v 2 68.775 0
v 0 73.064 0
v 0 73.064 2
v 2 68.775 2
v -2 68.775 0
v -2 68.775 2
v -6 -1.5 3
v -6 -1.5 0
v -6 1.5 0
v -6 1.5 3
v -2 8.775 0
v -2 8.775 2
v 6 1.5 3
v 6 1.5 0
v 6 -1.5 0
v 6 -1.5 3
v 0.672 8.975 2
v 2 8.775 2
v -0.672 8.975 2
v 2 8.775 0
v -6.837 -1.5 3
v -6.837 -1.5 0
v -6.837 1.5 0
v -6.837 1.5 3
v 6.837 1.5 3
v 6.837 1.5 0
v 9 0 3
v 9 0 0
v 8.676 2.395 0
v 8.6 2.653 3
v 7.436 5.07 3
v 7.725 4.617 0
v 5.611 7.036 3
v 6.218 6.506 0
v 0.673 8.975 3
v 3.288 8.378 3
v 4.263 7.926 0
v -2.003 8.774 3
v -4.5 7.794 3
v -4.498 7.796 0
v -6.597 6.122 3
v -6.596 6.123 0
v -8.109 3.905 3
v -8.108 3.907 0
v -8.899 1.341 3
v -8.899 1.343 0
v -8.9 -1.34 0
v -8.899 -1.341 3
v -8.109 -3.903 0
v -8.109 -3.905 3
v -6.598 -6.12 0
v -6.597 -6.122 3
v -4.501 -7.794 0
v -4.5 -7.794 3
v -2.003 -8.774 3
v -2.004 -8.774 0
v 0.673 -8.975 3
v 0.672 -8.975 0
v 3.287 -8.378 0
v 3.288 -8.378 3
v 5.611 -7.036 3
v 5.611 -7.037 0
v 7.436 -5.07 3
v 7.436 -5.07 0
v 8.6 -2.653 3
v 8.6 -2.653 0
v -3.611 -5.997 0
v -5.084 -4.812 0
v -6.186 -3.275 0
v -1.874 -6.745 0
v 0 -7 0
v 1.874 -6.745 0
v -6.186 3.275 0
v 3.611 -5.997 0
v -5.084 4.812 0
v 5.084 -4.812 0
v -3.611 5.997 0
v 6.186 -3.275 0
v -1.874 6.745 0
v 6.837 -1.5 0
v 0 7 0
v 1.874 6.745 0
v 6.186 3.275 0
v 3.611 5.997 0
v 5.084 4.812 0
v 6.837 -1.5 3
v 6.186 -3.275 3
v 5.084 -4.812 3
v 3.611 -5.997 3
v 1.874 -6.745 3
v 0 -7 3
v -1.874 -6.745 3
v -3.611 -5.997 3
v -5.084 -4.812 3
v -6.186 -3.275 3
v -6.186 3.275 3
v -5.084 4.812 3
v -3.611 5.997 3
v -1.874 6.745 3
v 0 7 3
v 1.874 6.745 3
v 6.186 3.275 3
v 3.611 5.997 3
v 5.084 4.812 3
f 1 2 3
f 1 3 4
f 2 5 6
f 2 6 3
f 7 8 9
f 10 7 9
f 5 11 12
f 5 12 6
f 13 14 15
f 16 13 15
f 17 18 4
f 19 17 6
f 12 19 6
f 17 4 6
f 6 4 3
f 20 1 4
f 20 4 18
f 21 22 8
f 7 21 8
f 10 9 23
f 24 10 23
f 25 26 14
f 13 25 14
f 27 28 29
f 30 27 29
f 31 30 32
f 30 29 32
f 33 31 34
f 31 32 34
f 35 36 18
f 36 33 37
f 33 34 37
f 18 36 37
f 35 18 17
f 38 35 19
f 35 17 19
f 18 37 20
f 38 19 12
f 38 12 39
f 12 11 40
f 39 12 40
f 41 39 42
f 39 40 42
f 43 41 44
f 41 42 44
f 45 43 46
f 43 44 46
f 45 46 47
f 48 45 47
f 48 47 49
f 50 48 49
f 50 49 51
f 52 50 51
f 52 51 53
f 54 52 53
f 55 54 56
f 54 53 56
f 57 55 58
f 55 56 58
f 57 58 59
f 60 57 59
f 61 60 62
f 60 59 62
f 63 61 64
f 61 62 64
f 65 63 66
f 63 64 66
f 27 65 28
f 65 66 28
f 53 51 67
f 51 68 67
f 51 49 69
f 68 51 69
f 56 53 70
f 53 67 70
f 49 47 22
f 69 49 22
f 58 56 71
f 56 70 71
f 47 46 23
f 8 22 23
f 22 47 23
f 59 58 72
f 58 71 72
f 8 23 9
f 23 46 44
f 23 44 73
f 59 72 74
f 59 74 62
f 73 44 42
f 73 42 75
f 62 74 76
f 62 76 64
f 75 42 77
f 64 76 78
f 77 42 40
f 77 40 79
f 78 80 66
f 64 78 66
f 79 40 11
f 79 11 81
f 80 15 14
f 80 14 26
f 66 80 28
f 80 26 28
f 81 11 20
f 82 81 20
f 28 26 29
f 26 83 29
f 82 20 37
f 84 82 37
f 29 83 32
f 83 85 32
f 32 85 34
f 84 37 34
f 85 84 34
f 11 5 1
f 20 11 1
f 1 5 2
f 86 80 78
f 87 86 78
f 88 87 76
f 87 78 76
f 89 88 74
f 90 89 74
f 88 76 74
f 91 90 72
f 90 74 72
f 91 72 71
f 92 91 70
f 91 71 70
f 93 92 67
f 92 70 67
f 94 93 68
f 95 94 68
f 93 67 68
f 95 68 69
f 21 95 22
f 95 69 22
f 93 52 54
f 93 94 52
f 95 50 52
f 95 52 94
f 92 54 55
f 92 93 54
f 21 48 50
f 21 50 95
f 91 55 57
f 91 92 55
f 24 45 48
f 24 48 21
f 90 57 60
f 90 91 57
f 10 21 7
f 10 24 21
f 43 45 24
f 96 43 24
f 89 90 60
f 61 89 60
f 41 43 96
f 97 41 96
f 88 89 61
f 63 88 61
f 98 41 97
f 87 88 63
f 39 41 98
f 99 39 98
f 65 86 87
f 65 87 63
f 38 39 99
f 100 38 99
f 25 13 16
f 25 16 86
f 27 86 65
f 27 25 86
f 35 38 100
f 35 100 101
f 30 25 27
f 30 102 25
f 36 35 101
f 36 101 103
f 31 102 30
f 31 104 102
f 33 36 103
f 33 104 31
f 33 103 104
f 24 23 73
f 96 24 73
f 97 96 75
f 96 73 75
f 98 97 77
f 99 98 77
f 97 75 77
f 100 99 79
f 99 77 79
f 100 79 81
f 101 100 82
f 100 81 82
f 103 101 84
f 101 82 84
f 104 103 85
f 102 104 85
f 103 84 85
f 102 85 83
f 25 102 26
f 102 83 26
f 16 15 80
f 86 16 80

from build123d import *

# Parameters (mm, degrees)
SKETCH1_R           = 9
BOSS_EXTRUDE1_DEPTH = 3
BOSS_EXTRUDE2_DEPTH = 2


with BuildPart() as part:
    # Sketch1 → Boss-Extrude1 (new body)
    with BuildSketch(Plane.XY):
        Circle(SKETCH1_R)
        with BuildLine():
            Line((-6.837397166, -1.5), (-8, -1.5))
            Line((-8, -1.5), (-8, 1.5))
            Line((-8, 1.5), (-6.837397166, 1.5))
            ThreePointArc((-6.837397166, 1.5), (0, 7), (6.837397166, 1.5))
            Line((6.837397166, 1.5), (8, 1.5))
            Line((8, 1.5), (8, -1.5))
            Line((8, -1.5), (6.837397166, -1.5))
            ThreePointArc((6.837397166, -1.5), (0, -7), (-6.837397166, -1.5))
        make_face(mode=Mode.SUBTRACT)
        with BuildLine():
            Line((6, -1.5), (6.837397166, -1.5))
            ThreePointArc((6.837397166, -1.5), (6.959230567, -0.754393744), (7, 0))
            ThreePointArc((7, 0), (6.959230567, 0.754393744), (6.837397166, 1.5))
            Line((6.837397166, 1.5), (6, 1.5))
            Line((6, 1.5), (6, -1.5))
        make_face()
        with BuildLine():
            ThreePointArc((7, 0), (6.959230567, -0.754393744), (6.837397166, -1.5))
            Line((6.837397166, -1.5), (8, -1.5))
            Line((8, -1.5), (8, 1.5))
            Line((8, 1.5), (6.837397166, 1.5))
            ThreePointArc((6.837397166, 1.5), (6.959230567, 0.754393744), (7, 0))
        make_face()
        with BuildLine():
            Line((-8, 1.5), (-8, -1.5))
            Line((-8, -1.5), (-6.837397166, -1.5))
            ThreePointArc((-6.837397166, -1.5), (-7, 0), (-6.837397166, 1.5))
            Line((-6.837397166, 1.5), (-8, 1.5))
        make_face()
        with BuildLine():
            ThreePointArc((-6.837397166, 1.5), (-7, 0), (-6.837397166, -1.5))
            Line((-6.837397166, -1.5), (-6, -1.5))
            Line((-6, -1.5), (-6, 1.5))
            Line((-6, 1.5), (-6.837397166, 1.5))
        make_face()
    extrude(amount=BOSS_EXTRUDE1_DEPTH)

    # Sketch2 → Boss-Extrude2 (add)
    with BuildSketch(Plane(origin=(0, 0, 0), x_dir=(-1, 0, 0), z_dir=(0, 0, -1))):
        with BuildLine():
            Line((-2, 68.774964387), (-2, 8.774964387))
            ThreePointArc((-2, 8.774964387), (0, 9), (2, 8.774964387))
            Line((2, 8.774964387), (2, 68.774964387))
            Line((2, 68.774964387), (0, 73.063978228))
            Line((0, 73.063978228), (-2, 68.774964387))
        make_face()
    extrude(amount=-BOSS_EXTRUDE2_DEPTH)


solid = part.part
